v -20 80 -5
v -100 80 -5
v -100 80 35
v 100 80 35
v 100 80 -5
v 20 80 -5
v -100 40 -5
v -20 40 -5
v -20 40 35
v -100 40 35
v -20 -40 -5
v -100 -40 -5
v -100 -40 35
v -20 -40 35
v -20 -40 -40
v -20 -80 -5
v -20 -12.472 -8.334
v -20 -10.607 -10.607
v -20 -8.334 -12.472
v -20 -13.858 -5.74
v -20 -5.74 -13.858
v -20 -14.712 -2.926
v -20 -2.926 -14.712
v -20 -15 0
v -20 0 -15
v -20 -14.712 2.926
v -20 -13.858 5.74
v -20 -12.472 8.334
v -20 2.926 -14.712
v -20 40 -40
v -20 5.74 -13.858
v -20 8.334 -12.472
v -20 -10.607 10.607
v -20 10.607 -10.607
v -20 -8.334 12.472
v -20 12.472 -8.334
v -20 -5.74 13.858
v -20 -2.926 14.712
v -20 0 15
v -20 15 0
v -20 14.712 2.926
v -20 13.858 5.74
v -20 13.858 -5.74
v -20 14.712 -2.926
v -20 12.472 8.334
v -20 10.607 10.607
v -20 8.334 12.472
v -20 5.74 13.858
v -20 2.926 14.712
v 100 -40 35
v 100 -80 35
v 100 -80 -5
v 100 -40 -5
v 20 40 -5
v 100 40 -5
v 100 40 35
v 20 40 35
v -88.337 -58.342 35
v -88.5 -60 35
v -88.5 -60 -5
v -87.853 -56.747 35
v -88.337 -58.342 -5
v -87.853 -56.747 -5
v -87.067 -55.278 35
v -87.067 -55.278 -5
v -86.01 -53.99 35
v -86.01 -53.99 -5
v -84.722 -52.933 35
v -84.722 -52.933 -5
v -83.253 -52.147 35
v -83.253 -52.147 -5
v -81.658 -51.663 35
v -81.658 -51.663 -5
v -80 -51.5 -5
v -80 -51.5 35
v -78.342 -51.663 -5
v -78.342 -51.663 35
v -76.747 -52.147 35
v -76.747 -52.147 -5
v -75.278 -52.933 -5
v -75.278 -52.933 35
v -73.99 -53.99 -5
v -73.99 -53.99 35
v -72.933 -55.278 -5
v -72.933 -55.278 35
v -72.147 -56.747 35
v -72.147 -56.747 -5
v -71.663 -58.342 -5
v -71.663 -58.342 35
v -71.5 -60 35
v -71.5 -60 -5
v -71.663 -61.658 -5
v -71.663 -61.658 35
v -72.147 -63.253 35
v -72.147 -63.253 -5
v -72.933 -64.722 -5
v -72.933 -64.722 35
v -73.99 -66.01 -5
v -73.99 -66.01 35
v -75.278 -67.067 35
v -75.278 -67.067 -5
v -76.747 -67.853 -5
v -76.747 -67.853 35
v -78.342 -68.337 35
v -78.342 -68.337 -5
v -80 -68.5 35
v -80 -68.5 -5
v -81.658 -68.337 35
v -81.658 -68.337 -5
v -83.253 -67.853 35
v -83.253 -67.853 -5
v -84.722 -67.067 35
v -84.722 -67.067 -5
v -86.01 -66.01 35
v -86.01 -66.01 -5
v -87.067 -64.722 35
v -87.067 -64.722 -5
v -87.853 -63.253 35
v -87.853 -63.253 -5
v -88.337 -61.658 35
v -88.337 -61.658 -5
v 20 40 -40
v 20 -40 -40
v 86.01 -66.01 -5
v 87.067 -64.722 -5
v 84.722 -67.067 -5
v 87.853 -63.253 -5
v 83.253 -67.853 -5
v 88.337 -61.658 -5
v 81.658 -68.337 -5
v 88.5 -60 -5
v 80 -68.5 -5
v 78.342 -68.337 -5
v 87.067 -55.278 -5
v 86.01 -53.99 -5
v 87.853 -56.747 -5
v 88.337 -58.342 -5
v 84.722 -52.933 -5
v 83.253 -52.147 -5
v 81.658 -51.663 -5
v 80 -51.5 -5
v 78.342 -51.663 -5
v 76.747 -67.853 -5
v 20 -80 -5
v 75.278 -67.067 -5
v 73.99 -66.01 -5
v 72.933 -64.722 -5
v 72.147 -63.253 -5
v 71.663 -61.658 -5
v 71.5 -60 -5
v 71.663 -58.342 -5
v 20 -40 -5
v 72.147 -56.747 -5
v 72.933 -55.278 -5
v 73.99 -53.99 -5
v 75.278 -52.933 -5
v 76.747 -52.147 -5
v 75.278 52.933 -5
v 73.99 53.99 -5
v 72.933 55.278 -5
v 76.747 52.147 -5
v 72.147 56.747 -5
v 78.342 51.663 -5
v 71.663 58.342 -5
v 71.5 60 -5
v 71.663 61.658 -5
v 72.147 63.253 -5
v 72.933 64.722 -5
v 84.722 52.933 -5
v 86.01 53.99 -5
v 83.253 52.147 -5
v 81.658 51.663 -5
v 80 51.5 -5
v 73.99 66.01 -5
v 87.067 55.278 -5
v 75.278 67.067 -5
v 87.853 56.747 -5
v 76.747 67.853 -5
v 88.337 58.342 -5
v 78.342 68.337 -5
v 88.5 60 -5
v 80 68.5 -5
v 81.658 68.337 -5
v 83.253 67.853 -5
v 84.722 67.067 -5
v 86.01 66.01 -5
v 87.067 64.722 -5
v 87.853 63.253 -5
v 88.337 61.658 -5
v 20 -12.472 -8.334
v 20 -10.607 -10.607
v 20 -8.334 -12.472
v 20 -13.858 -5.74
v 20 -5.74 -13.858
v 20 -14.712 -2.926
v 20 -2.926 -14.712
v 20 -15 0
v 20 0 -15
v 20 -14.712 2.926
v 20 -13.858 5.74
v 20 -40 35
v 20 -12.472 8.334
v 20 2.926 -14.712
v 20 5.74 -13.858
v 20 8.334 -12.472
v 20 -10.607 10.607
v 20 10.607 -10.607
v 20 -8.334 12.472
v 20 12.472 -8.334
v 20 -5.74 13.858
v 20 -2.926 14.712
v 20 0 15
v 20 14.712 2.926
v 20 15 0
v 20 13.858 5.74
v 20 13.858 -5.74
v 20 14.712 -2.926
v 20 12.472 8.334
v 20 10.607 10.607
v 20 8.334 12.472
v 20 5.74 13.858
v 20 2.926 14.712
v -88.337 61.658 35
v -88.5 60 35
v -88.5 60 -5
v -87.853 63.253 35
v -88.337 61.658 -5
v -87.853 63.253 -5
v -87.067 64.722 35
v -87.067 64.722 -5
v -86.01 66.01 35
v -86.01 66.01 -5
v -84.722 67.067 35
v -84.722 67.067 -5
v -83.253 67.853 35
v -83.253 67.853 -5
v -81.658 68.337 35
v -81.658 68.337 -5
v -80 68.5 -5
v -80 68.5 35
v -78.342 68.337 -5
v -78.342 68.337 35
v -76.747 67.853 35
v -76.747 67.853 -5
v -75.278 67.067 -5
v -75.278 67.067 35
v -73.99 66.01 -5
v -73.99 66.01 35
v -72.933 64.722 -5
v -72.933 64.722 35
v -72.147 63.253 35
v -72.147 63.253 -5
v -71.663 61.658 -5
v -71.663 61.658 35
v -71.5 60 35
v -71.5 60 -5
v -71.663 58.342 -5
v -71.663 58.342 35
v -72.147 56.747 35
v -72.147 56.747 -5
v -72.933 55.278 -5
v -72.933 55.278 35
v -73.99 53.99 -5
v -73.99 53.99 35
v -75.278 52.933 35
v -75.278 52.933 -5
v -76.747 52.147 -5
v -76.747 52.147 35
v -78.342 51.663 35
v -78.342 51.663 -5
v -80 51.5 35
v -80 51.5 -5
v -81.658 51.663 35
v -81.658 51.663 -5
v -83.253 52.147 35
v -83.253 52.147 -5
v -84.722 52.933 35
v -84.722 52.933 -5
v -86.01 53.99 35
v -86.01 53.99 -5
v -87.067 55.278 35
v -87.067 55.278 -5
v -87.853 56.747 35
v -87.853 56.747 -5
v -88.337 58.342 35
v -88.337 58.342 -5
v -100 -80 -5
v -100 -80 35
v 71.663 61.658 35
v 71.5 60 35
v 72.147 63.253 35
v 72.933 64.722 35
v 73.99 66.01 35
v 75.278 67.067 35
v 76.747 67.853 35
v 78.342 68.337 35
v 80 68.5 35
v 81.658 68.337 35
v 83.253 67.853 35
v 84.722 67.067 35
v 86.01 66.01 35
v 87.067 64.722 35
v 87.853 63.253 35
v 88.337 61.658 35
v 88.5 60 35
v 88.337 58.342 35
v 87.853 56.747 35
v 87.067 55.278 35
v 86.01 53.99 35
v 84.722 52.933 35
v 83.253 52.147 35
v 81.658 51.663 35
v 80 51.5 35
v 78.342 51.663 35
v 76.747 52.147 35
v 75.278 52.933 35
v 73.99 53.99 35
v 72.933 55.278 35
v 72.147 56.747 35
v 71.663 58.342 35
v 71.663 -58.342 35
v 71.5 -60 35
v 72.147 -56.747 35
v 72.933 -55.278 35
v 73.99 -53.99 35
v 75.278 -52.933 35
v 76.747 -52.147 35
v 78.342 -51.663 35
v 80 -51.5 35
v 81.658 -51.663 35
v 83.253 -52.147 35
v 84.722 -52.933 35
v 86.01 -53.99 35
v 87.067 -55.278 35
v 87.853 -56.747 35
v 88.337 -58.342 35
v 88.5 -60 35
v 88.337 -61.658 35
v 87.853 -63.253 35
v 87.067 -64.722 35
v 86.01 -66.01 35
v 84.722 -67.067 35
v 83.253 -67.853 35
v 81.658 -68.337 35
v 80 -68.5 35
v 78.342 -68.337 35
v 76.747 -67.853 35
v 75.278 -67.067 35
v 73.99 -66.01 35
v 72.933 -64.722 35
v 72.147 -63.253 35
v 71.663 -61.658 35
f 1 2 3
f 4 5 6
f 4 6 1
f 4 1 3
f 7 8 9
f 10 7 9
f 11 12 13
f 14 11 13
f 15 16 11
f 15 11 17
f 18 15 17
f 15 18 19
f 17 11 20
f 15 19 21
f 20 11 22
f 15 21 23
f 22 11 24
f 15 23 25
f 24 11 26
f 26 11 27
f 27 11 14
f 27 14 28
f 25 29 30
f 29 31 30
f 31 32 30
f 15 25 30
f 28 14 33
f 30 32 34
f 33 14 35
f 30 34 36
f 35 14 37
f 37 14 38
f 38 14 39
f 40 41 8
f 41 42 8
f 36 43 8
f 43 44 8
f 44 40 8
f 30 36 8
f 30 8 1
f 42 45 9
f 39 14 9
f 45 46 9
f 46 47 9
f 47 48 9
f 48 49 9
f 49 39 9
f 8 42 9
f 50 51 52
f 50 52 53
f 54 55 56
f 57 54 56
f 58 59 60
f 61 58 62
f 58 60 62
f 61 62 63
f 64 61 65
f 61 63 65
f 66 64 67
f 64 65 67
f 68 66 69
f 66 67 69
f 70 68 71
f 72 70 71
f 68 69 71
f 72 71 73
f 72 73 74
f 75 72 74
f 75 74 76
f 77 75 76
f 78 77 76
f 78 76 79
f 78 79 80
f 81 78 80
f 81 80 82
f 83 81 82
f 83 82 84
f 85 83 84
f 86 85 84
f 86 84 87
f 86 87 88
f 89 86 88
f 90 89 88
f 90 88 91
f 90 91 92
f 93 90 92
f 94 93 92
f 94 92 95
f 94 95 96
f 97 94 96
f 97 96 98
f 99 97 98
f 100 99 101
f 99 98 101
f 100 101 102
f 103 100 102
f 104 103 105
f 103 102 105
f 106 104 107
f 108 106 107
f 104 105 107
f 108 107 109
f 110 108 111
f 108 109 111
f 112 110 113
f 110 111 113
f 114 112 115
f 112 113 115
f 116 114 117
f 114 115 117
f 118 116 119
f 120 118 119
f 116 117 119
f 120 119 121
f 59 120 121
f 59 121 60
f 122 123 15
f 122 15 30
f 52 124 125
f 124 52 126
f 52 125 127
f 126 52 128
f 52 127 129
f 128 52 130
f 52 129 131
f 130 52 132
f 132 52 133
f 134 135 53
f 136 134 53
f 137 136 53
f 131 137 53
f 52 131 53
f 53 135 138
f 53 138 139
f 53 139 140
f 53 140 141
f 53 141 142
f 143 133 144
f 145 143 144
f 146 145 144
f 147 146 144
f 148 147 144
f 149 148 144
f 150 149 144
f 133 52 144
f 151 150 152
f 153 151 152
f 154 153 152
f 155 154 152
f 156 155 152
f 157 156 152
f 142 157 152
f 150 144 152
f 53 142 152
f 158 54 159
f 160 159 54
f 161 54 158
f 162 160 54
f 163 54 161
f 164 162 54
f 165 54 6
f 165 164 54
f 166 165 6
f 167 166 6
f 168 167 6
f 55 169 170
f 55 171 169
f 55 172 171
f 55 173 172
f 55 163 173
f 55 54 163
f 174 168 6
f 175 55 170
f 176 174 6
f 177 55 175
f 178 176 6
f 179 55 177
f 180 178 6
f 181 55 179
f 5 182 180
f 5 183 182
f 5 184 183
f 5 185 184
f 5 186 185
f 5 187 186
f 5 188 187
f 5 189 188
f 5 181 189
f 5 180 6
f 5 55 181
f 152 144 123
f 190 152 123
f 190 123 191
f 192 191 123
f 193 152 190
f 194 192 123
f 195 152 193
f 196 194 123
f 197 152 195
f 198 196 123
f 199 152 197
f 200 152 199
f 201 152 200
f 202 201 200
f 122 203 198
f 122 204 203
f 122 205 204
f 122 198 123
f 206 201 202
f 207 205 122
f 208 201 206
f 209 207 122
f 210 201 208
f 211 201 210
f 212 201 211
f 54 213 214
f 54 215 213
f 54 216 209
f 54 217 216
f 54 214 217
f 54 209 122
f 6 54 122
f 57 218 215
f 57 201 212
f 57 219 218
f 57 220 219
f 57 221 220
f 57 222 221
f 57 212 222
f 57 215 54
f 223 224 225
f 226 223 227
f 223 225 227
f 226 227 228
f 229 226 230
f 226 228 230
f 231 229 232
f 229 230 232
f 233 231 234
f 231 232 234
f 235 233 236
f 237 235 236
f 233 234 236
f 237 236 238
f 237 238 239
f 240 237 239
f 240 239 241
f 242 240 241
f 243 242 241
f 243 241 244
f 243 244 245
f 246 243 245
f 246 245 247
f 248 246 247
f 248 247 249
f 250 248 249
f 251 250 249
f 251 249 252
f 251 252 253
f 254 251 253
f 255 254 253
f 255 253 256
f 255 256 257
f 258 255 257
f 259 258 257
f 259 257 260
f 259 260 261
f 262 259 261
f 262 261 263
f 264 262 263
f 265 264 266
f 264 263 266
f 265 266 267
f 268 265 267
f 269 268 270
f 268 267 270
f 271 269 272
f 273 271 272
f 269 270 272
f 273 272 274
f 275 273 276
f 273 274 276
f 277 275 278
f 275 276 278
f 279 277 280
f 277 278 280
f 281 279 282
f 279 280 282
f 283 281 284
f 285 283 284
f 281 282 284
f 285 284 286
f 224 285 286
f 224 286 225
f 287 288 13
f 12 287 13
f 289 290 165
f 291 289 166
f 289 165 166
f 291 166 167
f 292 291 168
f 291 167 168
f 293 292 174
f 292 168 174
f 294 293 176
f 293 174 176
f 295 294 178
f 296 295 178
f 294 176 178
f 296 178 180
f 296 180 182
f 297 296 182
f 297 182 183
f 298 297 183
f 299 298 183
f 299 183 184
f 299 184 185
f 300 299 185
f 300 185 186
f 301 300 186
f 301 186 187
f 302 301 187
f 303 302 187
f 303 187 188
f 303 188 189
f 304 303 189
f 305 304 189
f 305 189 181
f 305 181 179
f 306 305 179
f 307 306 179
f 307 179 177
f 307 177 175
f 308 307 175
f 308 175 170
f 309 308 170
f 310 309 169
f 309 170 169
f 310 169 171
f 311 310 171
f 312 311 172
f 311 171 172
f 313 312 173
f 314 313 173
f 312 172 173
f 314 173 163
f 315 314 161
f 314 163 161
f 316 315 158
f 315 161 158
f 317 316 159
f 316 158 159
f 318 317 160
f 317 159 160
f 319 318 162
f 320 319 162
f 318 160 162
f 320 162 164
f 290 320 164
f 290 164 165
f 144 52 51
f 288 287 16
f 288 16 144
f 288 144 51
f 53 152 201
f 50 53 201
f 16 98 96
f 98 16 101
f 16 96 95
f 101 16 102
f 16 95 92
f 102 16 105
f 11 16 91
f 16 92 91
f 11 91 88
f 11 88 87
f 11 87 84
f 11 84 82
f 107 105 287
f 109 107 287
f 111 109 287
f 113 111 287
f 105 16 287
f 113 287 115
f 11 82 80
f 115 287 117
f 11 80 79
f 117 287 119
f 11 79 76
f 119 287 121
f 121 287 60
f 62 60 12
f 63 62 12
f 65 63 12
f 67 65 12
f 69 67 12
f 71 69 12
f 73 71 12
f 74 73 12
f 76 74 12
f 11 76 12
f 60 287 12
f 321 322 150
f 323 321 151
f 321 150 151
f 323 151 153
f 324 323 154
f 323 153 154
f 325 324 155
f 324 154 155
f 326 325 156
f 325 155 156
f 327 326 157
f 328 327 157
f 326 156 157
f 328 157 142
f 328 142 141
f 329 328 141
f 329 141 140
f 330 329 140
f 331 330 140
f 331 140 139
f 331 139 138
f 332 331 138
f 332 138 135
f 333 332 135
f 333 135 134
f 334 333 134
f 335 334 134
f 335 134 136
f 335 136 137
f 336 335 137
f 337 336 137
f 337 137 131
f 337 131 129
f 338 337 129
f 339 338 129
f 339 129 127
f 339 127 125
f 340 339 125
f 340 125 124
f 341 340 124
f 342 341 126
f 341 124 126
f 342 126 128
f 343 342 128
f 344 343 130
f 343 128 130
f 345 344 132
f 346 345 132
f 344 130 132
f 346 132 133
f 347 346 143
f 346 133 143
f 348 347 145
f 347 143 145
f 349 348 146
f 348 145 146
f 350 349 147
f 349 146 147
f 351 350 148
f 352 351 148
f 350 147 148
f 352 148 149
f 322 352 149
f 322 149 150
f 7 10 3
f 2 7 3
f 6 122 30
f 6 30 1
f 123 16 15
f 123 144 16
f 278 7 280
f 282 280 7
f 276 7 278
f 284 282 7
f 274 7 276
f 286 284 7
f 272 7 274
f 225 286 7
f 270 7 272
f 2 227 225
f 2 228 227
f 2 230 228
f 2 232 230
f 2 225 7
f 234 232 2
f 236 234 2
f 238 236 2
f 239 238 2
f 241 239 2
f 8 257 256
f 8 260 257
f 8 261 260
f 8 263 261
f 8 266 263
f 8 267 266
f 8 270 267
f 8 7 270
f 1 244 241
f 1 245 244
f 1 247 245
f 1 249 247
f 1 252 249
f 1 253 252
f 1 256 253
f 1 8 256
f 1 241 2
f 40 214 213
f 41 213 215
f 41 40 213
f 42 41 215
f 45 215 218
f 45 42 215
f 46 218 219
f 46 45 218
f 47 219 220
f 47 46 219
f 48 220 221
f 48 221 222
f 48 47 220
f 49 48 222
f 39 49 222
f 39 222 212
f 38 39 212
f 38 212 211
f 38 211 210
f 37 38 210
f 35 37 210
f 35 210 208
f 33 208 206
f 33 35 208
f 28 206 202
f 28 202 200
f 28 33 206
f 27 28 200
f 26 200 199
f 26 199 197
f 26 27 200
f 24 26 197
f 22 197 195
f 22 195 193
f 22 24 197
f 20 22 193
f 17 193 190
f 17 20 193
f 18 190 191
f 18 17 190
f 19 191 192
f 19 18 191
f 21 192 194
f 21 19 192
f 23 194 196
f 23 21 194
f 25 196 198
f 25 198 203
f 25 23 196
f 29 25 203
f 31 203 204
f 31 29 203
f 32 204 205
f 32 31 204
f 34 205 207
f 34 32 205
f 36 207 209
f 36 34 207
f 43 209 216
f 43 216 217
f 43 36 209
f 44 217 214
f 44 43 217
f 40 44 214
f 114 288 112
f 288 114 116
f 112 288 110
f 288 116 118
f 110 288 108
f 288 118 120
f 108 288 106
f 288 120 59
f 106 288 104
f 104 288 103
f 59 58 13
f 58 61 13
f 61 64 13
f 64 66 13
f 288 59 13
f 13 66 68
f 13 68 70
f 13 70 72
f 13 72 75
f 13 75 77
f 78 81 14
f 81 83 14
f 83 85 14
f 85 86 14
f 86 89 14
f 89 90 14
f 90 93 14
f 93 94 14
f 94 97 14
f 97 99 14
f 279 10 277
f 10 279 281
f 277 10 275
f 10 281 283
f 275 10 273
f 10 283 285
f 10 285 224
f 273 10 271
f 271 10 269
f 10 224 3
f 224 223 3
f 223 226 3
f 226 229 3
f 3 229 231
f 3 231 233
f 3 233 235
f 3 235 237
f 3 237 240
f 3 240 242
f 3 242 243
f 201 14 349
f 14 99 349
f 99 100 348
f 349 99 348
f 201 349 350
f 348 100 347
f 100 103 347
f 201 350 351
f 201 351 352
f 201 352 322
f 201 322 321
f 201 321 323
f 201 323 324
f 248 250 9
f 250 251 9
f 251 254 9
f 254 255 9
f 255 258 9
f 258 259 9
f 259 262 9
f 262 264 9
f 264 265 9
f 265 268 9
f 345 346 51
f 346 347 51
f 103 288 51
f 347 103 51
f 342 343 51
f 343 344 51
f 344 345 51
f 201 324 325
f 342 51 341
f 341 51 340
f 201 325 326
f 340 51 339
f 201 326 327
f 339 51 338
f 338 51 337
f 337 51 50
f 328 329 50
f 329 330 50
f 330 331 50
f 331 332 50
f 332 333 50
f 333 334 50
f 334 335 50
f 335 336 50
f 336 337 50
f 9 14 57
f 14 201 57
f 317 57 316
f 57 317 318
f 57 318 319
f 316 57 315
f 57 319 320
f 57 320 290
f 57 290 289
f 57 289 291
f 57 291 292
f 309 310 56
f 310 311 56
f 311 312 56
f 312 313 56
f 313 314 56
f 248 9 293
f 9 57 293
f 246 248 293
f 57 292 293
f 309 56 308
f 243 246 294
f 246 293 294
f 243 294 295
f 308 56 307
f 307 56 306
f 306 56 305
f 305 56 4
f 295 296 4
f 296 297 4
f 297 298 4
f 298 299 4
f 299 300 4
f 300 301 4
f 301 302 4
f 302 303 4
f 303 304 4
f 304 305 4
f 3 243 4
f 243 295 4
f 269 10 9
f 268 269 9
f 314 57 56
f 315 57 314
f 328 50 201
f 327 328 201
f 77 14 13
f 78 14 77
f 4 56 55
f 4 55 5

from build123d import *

# Parameters (mm, degrees)
F0_R     = 15
F1_DEPTH = 20
F2_W     = 40
F2_H     = 40
F3_DEPTH = 100
F5_D     = 17


with BuildPart() as f1:
    # F0 (on Right) → F1 (new body, symmetric)
    with BuildSketch(Plane.YZ):
        Polygon((-80, -5), (-40, -40), (40, -40), (80, -5), (80, 35), (-80, 35), align=None)
        Circle(F0_R, mode=Mode.SUBTRACT)
    extrude(amount=F1_DEPTH, both=True)

    # F2 (on Right) → F3 (join, symmetric)
    with BuildSketch(Plane.YZ):
        with Locations((-60, 15)):
            Rectangle(F2_W, F2_H)
        with Locations((60, 15)):
            Rectangle(F2_W, F2_H)
    extrude(amount=F3_DEPTH, both=True)

    # F5 (through all)
    with Locations(Plane.XY.offset(35)):
        with Locations((-80, 60), (80, 60), (80, -60), (-80, -60)):
            Hole(F5_D / 2)


solid = f1.part
